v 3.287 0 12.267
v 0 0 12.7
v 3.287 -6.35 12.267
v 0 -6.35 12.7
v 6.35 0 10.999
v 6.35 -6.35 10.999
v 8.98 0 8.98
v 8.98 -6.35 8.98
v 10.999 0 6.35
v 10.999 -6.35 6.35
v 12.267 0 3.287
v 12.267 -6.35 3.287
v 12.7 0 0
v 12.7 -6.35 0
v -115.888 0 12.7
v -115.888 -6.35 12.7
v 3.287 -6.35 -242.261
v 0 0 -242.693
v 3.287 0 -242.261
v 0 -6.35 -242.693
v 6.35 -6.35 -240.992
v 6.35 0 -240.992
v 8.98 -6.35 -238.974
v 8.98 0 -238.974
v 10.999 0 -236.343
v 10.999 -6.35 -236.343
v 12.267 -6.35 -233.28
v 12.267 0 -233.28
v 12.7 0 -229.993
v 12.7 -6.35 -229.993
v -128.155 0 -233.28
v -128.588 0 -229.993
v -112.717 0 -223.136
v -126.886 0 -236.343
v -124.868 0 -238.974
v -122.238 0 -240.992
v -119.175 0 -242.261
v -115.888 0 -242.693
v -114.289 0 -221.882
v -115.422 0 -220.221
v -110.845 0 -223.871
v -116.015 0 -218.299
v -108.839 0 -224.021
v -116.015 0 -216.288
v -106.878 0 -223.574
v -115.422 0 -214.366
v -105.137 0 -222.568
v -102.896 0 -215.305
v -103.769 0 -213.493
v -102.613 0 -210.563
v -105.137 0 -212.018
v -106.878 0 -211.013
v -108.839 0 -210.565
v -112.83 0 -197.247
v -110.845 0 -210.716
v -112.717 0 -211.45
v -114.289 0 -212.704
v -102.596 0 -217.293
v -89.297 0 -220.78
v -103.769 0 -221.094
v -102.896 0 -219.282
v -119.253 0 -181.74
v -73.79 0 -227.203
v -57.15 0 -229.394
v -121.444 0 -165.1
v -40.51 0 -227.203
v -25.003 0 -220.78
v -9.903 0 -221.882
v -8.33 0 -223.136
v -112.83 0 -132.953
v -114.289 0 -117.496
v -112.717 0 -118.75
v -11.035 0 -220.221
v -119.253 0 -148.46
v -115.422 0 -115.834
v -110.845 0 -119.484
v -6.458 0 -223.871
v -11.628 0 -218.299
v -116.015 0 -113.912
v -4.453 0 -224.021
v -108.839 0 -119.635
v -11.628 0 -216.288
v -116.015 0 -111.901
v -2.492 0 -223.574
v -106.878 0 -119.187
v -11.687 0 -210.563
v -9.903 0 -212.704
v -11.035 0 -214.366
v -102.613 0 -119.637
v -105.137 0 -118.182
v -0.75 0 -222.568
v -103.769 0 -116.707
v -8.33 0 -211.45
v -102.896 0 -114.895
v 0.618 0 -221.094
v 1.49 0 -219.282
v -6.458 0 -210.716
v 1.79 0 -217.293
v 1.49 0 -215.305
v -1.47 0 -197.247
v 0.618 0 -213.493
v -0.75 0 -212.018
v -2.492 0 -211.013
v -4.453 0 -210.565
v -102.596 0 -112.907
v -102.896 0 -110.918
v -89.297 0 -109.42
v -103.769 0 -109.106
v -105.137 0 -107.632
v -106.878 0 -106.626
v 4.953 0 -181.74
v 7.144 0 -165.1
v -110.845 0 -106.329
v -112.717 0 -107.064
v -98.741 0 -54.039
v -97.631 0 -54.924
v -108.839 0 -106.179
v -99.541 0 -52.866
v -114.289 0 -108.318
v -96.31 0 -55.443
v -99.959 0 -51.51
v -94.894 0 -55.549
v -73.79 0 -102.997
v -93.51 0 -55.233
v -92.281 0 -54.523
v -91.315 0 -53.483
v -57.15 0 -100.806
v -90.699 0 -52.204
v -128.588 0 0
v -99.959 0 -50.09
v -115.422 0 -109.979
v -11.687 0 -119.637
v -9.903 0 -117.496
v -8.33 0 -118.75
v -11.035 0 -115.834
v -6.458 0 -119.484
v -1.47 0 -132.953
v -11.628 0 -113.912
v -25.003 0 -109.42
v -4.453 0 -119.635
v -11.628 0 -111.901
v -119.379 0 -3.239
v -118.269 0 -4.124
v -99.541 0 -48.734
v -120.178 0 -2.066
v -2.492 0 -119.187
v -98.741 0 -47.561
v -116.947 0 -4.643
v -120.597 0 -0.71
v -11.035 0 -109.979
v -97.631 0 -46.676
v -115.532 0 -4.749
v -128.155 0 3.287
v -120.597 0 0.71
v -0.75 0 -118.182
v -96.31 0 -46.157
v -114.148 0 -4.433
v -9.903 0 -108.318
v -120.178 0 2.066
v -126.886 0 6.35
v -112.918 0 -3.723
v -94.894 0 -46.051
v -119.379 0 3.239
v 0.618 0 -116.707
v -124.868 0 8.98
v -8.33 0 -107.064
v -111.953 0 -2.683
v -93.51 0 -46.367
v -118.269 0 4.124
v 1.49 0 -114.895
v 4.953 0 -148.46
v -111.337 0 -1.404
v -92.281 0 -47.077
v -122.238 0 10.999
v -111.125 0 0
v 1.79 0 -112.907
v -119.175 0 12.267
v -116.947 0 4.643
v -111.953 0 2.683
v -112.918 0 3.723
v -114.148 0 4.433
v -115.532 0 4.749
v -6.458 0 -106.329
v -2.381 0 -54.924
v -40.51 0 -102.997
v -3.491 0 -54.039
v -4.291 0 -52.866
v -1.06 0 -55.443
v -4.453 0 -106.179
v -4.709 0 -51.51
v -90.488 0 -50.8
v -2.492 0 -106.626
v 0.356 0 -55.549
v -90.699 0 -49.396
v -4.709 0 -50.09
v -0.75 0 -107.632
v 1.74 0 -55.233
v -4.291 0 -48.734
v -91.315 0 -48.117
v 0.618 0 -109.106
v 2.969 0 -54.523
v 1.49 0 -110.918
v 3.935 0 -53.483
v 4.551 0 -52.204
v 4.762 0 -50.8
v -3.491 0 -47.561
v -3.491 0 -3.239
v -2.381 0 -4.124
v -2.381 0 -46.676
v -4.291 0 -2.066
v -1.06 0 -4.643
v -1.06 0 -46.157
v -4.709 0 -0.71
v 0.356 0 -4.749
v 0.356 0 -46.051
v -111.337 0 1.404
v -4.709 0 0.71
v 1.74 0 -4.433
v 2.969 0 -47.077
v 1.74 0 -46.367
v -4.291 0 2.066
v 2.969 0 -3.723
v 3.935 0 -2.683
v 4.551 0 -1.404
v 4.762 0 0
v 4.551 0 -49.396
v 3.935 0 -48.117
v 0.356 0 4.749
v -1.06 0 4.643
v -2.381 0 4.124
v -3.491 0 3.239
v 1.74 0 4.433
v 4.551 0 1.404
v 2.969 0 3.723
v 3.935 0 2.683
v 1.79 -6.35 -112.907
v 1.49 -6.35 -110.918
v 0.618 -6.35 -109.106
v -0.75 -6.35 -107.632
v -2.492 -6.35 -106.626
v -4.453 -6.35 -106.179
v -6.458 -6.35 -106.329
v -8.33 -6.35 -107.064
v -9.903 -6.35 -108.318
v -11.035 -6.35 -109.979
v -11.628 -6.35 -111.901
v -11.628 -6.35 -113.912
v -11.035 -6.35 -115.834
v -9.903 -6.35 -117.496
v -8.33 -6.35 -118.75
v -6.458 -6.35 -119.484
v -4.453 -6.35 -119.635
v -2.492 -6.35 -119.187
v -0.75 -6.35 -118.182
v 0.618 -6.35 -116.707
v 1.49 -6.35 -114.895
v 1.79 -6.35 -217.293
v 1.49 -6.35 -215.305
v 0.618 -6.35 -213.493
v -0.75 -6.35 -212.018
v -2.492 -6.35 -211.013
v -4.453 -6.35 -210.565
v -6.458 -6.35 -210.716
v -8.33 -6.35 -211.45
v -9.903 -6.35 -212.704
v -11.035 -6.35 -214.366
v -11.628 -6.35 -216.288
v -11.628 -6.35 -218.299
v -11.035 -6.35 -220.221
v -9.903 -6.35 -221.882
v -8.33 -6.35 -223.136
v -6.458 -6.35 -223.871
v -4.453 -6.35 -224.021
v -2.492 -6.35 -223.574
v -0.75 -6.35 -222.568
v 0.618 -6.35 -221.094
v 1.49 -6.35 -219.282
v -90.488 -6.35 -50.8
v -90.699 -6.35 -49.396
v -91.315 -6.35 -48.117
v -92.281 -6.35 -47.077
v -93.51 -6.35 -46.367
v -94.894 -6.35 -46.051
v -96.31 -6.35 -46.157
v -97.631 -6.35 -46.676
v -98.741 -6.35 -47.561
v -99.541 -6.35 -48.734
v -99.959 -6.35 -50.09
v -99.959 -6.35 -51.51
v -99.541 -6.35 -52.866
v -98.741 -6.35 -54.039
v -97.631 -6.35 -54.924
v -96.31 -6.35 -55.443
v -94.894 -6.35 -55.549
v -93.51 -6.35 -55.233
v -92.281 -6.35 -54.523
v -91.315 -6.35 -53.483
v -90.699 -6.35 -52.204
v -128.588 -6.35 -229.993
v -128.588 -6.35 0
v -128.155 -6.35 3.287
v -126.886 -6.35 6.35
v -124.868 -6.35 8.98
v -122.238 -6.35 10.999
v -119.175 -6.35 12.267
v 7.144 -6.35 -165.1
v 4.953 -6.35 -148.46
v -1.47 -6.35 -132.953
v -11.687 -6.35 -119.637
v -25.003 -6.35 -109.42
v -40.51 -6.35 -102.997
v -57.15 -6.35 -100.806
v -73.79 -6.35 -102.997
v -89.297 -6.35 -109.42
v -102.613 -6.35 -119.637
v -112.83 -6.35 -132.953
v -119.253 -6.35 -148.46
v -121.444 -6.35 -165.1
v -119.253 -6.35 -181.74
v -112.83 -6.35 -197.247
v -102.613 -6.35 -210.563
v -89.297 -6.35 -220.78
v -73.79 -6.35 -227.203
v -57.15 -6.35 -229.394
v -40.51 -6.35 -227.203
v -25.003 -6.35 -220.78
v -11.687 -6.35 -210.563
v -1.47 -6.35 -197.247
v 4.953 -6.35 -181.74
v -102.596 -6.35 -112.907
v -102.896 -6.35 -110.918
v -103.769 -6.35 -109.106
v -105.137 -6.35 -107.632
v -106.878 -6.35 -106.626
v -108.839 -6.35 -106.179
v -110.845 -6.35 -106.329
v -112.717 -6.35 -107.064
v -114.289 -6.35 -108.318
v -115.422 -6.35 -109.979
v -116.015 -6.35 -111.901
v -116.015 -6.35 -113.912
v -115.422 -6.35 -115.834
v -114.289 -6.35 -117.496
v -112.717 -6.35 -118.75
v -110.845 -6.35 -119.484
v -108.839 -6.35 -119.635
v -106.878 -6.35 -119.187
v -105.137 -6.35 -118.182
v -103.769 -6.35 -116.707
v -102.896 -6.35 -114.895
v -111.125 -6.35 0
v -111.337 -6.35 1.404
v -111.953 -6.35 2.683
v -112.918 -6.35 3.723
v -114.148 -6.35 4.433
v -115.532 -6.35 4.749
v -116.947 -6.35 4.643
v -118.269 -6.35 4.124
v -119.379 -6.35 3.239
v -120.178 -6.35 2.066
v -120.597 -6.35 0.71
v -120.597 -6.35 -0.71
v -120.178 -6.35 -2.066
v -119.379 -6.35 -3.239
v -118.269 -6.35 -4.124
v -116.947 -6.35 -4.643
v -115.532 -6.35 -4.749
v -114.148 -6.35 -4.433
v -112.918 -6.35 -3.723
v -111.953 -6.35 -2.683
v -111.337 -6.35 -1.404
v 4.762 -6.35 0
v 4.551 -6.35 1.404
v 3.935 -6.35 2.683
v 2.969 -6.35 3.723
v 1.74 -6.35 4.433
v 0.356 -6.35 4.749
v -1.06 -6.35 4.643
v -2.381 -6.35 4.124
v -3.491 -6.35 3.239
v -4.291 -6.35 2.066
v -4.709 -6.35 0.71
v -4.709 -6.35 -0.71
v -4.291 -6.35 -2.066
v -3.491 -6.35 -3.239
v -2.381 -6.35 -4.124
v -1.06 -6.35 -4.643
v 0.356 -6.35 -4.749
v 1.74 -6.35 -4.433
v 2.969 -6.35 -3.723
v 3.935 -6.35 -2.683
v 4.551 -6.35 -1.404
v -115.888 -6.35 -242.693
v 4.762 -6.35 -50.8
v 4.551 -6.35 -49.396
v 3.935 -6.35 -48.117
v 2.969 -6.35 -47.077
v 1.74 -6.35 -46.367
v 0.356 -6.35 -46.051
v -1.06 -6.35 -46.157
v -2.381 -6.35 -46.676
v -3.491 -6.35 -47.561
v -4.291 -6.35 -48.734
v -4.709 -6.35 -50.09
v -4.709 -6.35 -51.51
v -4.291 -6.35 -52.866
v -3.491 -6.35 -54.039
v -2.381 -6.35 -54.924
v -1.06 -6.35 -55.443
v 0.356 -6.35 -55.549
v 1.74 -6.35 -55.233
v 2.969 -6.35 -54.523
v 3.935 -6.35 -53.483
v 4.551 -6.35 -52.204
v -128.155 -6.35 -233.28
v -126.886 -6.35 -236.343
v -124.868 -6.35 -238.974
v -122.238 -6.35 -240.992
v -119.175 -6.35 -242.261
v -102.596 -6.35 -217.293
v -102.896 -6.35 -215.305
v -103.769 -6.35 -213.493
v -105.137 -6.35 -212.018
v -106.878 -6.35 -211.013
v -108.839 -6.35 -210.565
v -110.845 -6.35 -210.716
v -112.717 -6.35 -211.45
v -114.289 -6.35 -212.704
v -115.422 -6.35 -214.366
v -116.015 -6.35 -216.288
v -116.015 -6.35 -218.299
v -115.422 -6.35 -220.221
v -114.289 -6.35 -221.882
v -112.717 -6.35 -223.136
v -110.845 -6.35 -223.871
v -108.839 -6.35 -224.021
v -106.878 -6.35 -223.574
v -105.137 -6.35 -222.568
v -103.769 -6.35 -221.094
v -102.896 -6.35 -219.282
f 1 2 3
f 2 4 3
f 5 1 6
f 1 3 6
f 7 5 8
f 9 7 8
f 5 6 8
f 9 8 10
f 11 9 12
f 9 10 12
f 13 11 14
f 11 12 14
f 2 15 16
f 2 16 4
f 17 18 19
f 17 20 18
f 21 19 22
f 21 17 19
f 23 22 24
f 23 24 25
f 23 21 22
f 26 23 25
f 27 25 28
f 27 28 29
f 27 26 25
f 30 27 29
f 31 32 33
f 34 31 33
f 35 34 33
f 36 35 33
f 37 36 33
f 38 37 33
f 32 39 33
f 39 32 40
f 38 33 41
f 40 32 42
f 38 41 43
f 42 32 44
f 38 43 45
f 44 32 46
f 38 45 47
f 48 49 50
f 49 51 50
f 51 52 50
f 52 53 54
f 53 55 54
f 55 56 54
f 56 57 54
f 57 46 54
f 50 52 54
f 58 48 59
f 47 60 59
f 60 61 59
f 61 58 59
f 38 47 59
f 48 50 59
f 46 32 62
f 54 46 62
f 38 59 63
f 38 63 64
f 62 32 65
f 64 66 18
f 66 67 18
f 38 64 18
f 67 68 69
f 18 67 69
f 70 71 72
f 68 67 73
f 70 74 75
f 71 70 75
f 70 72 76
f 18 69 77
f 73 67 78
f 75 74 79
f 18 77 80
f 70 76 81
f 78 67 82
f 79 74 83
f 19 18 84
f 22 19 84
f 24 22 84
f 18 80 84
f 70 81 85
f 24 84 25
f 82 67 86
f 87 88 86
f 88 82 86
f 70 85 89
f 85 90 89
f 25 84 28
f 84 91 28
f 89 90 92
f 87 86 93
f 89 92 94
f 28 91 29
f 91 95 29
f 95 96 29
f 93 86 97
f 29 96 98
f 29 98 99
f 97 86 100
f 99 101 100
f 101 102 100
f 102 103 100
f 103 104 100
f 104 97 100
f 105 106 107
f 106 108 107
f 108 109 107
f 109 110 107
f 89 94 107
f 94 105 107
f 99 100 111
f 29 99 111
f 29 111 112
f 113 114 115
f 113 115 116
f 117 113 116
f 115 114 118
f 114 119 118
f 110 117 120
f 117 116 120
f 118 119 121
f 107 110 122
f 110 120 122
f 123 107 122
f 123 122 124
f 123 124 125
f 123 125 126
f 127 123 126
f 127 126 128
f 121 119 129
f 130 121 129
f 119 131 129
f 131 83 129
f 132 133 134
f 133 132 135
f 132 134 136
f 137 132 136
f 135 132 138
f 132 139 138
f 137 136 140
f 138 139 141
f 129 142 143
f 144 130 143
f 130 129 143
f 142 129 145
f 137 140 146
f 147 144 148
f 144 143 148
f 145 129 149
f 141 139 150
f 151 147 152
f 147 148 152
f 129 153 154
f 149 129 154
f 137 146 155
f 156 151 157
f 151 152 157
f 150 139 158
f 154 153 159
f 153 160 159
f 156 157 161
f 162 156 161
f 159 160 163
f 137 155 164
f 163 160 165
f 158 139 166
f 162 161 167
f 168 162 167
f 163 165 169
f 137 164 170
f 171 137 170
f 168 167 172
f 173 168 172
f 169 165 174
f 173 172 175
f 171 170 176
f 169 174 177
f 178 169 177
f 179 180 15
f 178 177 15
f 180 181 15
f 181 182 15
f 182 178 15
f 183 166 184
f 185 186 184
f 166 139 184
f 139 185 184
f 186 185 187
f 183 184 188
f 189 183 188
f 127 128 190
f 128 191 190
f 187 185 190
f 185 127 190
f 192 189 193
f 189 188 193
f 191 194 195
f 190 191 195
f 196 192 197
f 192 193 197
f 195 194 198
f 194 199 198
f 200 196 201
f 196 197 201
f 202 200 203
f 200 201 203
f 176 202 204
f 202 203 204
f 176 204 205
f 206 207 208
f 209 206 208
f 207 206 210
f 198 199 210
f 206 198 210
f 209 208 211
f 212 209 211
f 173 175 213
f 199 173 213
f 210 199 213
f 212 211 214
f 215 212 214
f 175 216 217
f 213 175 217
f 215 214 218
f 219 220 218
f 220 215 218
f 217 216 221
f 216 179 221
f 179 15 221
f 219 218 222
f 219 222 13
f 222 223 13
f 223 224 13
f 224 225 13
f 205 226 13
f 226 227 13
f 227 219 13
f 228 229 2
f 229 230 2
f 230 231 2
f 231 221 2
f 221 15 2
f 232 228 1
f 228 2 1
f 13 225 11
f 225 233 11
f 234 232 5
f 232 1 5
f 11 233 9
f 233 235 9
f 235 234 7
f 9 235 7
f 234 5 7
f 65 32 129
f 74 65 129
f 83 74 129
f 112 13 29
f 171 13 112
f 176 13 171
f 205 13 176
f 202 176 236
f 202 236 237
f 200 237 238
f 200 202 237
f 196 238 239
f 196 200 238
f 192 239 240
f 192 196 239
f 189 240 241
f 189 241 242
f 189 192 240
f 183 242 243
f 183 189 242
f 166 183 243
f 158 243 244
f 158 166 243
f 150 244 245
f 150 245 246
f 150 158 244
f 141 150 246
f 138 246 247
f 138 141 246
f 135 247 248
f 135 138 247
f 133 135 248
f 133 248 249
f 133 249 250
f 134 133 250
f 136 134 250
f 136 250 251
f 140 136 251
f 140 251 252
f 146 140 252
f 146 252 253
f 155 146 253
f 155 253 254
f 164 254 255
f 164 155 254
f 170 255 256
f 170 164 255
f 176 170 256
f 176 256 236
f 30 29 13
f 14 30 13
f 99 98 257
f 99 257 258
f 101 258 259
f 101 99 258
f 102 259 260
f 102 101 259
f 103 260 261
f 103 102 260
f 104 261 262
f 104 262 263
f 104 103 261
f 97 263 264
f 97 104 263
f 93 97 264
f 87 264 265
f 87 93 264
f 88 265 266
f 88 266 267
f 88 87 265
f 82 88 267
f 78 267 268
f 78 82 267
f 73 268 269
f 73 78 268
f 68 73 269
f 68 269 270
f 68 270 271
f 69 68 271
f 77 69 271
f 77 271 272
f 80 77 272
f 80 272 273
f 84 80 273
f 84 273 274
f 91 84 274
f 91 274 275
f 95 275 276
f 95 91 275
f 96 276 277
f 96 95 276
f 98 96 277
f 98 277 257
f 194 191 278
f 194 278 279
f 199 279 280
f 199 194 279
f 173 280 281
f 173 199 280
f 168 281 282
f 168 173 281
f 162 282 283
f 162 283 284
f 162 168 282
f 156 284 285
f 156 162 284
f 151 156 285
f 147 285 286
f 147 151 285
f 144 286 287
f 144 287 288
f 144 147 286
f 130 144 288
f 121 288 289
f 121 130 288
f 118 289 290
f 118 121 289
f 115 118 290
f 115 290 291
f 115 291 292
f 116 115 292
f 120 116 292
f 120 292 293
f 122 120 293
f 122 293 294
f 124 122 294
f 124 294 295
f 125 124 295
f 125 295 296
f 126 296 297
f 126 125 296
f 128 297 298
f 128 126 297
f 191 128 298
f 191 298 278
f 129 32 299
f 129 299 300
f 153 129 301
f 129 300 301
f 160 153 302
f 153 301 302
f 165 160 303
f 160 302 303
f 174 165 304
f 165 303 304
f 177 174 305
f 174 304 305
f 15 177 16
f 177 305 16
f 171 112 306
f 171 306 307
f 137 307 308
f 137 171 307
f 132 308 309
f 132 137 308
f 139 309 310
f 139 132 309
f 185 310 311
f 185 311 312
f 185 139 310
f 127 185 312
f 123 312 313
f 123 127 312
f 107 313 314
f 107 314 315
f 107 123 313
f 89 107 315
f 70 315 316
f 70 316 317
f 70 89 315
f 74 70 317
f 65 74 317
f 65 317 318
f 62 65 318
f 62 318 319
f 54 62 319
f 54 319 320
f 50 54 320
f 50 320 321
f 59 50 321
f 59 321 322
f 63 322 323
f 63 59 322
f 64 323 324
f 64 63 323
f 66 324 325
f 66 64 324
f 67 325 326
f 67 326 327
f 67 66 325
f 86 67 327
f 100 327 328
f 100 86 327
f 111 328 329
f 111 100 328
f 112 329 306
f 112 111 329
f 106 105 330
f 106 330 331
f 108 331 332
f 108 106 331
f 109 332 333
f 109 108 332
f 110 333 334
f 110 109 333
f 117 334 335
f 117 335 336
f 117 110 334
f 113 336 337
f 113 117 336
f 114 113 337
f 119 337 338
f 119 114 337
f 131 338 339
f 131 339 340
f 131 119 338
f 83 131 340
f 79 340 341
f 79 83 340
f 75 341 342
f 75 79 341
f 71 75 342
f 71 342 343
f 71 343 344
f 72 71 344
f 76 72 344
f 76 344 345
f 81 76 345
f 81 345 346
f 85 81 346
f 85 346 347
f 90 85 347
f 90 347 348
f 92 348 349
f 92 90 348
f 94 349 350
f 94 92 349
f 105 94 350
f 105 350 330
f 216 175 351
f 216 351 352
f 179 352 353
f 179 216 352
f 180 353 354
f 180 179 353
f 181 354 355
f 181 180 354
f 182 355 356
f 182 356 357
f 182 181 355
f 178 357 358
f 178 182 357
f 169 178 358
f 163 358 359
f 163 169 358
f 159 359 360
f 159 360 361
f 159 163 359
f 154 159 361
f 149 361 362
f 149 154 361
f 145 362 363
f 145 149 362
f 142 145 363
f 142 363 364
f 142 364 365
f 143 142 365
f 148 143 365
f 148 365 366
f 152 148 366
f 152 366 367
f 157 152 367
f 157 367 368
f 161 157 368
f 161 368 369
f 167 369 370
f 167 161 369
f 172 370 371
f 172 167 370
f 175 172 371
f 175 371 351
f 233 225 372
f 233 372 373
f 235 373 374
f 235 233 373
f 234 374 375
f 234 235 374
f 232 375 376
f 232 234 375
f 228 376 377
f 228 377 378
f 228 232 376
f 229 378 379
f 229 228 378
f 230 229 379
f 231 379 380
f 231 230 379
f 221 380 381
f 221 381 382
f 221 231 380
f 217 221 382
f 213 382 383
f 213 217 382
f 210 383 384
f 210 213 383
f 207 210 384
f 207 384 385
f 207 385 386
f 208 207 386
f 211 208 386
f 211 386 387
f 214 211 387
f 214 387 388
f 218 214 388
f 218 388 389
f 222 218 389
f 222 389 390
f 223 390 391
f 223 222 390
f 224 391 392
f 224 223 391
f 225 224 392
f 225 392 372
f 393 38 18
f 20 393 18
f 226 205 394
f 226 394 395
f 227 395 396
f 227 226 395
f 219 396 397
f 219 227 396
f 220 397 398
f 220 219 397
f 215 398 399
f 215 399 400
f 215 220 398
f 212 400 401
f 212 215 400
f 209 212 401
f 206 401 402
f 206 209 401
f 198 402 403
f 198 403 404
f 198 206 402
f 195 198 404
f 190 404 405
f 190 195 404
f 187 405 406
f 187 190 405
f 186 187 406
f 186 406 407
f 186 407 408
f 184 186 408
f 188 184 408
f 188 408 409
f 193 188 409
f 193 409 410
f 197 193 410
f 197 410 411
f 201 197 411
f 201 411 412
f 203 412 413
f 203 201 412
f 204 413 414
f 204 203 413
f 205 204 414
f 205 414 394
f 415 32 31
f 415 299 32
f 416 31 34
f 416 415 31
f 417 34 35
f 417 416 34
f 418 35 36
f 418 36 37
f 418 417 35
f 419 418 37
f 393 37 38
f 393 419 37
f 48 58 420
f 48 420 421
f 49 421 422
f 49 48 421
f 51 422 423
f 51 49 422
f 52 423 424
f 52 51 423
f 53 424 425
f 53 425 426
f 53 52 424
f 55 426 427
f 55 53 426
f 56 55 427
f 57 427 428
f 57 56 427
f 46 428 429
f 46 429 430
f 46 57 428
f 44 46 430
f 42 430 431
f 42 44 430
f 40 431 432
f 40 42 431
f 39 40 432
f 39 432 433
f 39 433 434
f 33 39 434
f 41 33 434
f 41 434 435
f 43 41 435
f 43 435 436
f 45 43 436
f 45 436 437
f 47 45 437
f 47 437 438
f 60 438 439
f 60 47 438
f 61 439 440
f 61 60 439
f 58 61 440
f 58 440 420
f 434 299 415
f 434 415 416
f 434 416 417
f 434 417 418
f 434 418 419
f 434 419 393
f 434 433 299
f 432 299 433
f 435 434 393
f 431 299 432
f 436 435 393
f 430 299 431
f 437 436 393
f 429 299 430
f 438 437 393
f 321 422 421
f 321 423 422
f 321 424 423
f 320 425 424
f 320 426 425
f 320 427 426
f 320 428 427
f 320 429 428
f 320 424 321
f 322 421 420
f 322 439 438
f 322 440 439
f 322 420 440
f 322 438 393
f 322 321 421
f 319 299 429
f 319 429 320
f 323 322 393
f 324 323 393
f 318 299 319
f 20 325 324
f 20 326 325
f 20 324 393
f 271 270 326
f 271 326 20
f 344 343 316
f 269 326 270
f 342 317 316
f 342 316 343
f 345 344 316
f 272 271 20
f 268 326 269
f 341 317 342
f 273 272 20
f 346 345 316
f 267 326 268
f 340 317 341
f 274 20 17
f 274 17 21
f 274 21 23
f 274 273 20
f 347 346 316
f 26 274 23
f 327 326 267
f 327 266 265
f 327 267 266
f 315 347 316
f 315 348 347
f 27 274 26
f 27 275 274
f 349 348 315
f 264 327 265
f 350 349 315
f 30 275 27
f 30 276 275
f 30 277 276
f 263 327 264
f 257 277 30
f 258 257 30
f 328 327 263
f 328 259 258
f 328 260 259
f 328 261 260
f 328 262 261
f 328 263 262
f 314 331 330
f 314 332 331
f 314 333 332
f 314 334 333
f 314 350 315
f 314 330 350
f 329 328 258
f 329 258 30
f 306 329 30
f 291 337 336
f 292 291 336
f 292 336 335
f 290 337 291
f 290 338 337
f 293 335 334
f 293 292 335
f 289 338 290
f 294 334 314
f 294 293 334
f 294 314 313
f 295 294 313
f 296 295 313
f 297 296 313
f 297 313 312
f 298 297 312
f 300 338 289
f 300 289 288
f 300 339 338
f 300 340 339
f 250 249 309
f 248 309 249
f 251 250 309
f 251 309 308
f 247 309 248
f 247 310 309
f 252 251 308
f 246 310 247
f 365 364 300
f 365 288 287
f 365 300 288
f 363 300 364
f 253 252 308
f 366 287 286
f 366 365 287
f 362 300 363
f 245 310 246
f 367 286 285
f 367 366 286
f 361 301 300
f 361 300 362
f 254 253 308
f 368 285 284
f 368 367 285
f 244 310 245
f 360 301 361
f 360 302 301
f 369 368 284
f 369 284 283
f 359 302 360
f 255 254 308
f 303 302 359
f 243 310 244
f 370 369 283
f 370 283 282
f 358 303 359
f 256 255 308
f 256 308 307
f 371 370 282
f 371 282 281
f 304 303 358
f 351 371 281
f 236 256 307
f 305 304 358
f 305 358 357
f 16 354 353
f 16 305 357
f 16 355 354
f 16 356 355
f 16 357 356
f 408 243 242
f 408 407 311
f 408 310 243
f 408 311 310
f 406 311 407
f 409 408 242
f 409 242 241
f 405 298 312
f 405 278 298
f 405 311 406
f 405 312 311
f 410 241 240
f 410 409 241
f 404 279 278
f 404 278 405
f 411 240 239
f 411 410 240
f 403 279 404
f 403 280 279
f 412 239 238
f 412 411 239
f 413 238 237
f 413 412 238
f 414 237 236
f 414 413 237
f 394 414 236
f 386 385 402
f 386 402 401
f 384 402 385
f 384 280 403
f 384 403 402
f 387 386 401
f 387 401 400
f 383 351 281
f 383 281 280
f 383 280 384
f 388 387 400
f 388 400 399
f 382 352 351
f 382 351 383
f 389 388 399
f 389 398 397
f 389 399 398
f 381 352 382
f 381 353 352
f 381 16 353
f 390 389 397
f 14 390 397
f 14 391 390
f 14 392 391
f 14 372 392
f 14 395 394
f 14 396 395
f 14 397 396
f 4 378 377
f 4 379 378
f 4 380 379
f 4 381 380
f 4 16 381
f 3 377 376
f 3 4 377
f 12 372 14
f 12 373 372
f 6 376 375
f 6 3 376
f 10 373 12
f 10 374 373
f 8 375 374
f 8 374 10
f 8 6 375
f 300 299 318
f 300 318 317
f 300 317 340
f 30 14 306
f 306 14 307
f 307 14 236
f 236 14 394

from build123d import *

# Parameters (mm, degrees)
F0_W     = 141.2875
F0_H     = 255.393249
F0_R     = 6.746875
F0_R_2   = 64.29375
F0_R_3   = 4.7625
F1_DEPTH = 6.35
F2_R     = 12.7


with BuildPart() as f1:
    # F0 (on Front) → F1 (new body)
    with BuildSketch(Plane.XZ):
        with Locations((-57.94375, -114.996624)):
            Rectangle(F0_W, F0_H)
        with Locations((-109.343249, -217.293249)):
            Circle(F0_R, mode=Mode.SUBTRACT)
        with Locations((-4.956751, -217.293249)):
            Circle(F0_R, mode=Mode.SUBTRACT)
        with Locations((-57.15, -165.1)):
            Circle(F0_R_2, mode=Mode.SUBTRACT)
        with Locations((-109.343249, -112.906751)):
            Circle(F0_R, mode=Mode.SUBTRACT)
        with Locations((-95.25, -50.8)):
            Circle(F0_R_3, mode=Mode.SUBTRACT)
        with Locations((-115.8875, 0)):
            Circle(F0_R_3, mode=Mode.SUBTRACT)
        with Locations((-4.956751, -112.906751)):
            Circle(F0_R, mode=Mode.SUBTRACT)
        with Locations((0, -50.8)):
            Circle(F0_R_3, mode=Mode.SUBTRACT)
        Circle(F0_R_3, mode=Mode.SUBTRACT)
    extrude(amount=F1_DEPTH)

    # F2
    f2_edges = [f1.edges().sort_by_distance(p)[0] for p in [
        (-128.5875, -3.175, -242.693249),
        (12.7, -3.175, -242.693249),
        (12.7, -3.175, 12.7),
        (-128.5875, -3.175, 12.7),
    ]]
    fillet(f2_edges, radius=F2_R)


solid = f1.part
